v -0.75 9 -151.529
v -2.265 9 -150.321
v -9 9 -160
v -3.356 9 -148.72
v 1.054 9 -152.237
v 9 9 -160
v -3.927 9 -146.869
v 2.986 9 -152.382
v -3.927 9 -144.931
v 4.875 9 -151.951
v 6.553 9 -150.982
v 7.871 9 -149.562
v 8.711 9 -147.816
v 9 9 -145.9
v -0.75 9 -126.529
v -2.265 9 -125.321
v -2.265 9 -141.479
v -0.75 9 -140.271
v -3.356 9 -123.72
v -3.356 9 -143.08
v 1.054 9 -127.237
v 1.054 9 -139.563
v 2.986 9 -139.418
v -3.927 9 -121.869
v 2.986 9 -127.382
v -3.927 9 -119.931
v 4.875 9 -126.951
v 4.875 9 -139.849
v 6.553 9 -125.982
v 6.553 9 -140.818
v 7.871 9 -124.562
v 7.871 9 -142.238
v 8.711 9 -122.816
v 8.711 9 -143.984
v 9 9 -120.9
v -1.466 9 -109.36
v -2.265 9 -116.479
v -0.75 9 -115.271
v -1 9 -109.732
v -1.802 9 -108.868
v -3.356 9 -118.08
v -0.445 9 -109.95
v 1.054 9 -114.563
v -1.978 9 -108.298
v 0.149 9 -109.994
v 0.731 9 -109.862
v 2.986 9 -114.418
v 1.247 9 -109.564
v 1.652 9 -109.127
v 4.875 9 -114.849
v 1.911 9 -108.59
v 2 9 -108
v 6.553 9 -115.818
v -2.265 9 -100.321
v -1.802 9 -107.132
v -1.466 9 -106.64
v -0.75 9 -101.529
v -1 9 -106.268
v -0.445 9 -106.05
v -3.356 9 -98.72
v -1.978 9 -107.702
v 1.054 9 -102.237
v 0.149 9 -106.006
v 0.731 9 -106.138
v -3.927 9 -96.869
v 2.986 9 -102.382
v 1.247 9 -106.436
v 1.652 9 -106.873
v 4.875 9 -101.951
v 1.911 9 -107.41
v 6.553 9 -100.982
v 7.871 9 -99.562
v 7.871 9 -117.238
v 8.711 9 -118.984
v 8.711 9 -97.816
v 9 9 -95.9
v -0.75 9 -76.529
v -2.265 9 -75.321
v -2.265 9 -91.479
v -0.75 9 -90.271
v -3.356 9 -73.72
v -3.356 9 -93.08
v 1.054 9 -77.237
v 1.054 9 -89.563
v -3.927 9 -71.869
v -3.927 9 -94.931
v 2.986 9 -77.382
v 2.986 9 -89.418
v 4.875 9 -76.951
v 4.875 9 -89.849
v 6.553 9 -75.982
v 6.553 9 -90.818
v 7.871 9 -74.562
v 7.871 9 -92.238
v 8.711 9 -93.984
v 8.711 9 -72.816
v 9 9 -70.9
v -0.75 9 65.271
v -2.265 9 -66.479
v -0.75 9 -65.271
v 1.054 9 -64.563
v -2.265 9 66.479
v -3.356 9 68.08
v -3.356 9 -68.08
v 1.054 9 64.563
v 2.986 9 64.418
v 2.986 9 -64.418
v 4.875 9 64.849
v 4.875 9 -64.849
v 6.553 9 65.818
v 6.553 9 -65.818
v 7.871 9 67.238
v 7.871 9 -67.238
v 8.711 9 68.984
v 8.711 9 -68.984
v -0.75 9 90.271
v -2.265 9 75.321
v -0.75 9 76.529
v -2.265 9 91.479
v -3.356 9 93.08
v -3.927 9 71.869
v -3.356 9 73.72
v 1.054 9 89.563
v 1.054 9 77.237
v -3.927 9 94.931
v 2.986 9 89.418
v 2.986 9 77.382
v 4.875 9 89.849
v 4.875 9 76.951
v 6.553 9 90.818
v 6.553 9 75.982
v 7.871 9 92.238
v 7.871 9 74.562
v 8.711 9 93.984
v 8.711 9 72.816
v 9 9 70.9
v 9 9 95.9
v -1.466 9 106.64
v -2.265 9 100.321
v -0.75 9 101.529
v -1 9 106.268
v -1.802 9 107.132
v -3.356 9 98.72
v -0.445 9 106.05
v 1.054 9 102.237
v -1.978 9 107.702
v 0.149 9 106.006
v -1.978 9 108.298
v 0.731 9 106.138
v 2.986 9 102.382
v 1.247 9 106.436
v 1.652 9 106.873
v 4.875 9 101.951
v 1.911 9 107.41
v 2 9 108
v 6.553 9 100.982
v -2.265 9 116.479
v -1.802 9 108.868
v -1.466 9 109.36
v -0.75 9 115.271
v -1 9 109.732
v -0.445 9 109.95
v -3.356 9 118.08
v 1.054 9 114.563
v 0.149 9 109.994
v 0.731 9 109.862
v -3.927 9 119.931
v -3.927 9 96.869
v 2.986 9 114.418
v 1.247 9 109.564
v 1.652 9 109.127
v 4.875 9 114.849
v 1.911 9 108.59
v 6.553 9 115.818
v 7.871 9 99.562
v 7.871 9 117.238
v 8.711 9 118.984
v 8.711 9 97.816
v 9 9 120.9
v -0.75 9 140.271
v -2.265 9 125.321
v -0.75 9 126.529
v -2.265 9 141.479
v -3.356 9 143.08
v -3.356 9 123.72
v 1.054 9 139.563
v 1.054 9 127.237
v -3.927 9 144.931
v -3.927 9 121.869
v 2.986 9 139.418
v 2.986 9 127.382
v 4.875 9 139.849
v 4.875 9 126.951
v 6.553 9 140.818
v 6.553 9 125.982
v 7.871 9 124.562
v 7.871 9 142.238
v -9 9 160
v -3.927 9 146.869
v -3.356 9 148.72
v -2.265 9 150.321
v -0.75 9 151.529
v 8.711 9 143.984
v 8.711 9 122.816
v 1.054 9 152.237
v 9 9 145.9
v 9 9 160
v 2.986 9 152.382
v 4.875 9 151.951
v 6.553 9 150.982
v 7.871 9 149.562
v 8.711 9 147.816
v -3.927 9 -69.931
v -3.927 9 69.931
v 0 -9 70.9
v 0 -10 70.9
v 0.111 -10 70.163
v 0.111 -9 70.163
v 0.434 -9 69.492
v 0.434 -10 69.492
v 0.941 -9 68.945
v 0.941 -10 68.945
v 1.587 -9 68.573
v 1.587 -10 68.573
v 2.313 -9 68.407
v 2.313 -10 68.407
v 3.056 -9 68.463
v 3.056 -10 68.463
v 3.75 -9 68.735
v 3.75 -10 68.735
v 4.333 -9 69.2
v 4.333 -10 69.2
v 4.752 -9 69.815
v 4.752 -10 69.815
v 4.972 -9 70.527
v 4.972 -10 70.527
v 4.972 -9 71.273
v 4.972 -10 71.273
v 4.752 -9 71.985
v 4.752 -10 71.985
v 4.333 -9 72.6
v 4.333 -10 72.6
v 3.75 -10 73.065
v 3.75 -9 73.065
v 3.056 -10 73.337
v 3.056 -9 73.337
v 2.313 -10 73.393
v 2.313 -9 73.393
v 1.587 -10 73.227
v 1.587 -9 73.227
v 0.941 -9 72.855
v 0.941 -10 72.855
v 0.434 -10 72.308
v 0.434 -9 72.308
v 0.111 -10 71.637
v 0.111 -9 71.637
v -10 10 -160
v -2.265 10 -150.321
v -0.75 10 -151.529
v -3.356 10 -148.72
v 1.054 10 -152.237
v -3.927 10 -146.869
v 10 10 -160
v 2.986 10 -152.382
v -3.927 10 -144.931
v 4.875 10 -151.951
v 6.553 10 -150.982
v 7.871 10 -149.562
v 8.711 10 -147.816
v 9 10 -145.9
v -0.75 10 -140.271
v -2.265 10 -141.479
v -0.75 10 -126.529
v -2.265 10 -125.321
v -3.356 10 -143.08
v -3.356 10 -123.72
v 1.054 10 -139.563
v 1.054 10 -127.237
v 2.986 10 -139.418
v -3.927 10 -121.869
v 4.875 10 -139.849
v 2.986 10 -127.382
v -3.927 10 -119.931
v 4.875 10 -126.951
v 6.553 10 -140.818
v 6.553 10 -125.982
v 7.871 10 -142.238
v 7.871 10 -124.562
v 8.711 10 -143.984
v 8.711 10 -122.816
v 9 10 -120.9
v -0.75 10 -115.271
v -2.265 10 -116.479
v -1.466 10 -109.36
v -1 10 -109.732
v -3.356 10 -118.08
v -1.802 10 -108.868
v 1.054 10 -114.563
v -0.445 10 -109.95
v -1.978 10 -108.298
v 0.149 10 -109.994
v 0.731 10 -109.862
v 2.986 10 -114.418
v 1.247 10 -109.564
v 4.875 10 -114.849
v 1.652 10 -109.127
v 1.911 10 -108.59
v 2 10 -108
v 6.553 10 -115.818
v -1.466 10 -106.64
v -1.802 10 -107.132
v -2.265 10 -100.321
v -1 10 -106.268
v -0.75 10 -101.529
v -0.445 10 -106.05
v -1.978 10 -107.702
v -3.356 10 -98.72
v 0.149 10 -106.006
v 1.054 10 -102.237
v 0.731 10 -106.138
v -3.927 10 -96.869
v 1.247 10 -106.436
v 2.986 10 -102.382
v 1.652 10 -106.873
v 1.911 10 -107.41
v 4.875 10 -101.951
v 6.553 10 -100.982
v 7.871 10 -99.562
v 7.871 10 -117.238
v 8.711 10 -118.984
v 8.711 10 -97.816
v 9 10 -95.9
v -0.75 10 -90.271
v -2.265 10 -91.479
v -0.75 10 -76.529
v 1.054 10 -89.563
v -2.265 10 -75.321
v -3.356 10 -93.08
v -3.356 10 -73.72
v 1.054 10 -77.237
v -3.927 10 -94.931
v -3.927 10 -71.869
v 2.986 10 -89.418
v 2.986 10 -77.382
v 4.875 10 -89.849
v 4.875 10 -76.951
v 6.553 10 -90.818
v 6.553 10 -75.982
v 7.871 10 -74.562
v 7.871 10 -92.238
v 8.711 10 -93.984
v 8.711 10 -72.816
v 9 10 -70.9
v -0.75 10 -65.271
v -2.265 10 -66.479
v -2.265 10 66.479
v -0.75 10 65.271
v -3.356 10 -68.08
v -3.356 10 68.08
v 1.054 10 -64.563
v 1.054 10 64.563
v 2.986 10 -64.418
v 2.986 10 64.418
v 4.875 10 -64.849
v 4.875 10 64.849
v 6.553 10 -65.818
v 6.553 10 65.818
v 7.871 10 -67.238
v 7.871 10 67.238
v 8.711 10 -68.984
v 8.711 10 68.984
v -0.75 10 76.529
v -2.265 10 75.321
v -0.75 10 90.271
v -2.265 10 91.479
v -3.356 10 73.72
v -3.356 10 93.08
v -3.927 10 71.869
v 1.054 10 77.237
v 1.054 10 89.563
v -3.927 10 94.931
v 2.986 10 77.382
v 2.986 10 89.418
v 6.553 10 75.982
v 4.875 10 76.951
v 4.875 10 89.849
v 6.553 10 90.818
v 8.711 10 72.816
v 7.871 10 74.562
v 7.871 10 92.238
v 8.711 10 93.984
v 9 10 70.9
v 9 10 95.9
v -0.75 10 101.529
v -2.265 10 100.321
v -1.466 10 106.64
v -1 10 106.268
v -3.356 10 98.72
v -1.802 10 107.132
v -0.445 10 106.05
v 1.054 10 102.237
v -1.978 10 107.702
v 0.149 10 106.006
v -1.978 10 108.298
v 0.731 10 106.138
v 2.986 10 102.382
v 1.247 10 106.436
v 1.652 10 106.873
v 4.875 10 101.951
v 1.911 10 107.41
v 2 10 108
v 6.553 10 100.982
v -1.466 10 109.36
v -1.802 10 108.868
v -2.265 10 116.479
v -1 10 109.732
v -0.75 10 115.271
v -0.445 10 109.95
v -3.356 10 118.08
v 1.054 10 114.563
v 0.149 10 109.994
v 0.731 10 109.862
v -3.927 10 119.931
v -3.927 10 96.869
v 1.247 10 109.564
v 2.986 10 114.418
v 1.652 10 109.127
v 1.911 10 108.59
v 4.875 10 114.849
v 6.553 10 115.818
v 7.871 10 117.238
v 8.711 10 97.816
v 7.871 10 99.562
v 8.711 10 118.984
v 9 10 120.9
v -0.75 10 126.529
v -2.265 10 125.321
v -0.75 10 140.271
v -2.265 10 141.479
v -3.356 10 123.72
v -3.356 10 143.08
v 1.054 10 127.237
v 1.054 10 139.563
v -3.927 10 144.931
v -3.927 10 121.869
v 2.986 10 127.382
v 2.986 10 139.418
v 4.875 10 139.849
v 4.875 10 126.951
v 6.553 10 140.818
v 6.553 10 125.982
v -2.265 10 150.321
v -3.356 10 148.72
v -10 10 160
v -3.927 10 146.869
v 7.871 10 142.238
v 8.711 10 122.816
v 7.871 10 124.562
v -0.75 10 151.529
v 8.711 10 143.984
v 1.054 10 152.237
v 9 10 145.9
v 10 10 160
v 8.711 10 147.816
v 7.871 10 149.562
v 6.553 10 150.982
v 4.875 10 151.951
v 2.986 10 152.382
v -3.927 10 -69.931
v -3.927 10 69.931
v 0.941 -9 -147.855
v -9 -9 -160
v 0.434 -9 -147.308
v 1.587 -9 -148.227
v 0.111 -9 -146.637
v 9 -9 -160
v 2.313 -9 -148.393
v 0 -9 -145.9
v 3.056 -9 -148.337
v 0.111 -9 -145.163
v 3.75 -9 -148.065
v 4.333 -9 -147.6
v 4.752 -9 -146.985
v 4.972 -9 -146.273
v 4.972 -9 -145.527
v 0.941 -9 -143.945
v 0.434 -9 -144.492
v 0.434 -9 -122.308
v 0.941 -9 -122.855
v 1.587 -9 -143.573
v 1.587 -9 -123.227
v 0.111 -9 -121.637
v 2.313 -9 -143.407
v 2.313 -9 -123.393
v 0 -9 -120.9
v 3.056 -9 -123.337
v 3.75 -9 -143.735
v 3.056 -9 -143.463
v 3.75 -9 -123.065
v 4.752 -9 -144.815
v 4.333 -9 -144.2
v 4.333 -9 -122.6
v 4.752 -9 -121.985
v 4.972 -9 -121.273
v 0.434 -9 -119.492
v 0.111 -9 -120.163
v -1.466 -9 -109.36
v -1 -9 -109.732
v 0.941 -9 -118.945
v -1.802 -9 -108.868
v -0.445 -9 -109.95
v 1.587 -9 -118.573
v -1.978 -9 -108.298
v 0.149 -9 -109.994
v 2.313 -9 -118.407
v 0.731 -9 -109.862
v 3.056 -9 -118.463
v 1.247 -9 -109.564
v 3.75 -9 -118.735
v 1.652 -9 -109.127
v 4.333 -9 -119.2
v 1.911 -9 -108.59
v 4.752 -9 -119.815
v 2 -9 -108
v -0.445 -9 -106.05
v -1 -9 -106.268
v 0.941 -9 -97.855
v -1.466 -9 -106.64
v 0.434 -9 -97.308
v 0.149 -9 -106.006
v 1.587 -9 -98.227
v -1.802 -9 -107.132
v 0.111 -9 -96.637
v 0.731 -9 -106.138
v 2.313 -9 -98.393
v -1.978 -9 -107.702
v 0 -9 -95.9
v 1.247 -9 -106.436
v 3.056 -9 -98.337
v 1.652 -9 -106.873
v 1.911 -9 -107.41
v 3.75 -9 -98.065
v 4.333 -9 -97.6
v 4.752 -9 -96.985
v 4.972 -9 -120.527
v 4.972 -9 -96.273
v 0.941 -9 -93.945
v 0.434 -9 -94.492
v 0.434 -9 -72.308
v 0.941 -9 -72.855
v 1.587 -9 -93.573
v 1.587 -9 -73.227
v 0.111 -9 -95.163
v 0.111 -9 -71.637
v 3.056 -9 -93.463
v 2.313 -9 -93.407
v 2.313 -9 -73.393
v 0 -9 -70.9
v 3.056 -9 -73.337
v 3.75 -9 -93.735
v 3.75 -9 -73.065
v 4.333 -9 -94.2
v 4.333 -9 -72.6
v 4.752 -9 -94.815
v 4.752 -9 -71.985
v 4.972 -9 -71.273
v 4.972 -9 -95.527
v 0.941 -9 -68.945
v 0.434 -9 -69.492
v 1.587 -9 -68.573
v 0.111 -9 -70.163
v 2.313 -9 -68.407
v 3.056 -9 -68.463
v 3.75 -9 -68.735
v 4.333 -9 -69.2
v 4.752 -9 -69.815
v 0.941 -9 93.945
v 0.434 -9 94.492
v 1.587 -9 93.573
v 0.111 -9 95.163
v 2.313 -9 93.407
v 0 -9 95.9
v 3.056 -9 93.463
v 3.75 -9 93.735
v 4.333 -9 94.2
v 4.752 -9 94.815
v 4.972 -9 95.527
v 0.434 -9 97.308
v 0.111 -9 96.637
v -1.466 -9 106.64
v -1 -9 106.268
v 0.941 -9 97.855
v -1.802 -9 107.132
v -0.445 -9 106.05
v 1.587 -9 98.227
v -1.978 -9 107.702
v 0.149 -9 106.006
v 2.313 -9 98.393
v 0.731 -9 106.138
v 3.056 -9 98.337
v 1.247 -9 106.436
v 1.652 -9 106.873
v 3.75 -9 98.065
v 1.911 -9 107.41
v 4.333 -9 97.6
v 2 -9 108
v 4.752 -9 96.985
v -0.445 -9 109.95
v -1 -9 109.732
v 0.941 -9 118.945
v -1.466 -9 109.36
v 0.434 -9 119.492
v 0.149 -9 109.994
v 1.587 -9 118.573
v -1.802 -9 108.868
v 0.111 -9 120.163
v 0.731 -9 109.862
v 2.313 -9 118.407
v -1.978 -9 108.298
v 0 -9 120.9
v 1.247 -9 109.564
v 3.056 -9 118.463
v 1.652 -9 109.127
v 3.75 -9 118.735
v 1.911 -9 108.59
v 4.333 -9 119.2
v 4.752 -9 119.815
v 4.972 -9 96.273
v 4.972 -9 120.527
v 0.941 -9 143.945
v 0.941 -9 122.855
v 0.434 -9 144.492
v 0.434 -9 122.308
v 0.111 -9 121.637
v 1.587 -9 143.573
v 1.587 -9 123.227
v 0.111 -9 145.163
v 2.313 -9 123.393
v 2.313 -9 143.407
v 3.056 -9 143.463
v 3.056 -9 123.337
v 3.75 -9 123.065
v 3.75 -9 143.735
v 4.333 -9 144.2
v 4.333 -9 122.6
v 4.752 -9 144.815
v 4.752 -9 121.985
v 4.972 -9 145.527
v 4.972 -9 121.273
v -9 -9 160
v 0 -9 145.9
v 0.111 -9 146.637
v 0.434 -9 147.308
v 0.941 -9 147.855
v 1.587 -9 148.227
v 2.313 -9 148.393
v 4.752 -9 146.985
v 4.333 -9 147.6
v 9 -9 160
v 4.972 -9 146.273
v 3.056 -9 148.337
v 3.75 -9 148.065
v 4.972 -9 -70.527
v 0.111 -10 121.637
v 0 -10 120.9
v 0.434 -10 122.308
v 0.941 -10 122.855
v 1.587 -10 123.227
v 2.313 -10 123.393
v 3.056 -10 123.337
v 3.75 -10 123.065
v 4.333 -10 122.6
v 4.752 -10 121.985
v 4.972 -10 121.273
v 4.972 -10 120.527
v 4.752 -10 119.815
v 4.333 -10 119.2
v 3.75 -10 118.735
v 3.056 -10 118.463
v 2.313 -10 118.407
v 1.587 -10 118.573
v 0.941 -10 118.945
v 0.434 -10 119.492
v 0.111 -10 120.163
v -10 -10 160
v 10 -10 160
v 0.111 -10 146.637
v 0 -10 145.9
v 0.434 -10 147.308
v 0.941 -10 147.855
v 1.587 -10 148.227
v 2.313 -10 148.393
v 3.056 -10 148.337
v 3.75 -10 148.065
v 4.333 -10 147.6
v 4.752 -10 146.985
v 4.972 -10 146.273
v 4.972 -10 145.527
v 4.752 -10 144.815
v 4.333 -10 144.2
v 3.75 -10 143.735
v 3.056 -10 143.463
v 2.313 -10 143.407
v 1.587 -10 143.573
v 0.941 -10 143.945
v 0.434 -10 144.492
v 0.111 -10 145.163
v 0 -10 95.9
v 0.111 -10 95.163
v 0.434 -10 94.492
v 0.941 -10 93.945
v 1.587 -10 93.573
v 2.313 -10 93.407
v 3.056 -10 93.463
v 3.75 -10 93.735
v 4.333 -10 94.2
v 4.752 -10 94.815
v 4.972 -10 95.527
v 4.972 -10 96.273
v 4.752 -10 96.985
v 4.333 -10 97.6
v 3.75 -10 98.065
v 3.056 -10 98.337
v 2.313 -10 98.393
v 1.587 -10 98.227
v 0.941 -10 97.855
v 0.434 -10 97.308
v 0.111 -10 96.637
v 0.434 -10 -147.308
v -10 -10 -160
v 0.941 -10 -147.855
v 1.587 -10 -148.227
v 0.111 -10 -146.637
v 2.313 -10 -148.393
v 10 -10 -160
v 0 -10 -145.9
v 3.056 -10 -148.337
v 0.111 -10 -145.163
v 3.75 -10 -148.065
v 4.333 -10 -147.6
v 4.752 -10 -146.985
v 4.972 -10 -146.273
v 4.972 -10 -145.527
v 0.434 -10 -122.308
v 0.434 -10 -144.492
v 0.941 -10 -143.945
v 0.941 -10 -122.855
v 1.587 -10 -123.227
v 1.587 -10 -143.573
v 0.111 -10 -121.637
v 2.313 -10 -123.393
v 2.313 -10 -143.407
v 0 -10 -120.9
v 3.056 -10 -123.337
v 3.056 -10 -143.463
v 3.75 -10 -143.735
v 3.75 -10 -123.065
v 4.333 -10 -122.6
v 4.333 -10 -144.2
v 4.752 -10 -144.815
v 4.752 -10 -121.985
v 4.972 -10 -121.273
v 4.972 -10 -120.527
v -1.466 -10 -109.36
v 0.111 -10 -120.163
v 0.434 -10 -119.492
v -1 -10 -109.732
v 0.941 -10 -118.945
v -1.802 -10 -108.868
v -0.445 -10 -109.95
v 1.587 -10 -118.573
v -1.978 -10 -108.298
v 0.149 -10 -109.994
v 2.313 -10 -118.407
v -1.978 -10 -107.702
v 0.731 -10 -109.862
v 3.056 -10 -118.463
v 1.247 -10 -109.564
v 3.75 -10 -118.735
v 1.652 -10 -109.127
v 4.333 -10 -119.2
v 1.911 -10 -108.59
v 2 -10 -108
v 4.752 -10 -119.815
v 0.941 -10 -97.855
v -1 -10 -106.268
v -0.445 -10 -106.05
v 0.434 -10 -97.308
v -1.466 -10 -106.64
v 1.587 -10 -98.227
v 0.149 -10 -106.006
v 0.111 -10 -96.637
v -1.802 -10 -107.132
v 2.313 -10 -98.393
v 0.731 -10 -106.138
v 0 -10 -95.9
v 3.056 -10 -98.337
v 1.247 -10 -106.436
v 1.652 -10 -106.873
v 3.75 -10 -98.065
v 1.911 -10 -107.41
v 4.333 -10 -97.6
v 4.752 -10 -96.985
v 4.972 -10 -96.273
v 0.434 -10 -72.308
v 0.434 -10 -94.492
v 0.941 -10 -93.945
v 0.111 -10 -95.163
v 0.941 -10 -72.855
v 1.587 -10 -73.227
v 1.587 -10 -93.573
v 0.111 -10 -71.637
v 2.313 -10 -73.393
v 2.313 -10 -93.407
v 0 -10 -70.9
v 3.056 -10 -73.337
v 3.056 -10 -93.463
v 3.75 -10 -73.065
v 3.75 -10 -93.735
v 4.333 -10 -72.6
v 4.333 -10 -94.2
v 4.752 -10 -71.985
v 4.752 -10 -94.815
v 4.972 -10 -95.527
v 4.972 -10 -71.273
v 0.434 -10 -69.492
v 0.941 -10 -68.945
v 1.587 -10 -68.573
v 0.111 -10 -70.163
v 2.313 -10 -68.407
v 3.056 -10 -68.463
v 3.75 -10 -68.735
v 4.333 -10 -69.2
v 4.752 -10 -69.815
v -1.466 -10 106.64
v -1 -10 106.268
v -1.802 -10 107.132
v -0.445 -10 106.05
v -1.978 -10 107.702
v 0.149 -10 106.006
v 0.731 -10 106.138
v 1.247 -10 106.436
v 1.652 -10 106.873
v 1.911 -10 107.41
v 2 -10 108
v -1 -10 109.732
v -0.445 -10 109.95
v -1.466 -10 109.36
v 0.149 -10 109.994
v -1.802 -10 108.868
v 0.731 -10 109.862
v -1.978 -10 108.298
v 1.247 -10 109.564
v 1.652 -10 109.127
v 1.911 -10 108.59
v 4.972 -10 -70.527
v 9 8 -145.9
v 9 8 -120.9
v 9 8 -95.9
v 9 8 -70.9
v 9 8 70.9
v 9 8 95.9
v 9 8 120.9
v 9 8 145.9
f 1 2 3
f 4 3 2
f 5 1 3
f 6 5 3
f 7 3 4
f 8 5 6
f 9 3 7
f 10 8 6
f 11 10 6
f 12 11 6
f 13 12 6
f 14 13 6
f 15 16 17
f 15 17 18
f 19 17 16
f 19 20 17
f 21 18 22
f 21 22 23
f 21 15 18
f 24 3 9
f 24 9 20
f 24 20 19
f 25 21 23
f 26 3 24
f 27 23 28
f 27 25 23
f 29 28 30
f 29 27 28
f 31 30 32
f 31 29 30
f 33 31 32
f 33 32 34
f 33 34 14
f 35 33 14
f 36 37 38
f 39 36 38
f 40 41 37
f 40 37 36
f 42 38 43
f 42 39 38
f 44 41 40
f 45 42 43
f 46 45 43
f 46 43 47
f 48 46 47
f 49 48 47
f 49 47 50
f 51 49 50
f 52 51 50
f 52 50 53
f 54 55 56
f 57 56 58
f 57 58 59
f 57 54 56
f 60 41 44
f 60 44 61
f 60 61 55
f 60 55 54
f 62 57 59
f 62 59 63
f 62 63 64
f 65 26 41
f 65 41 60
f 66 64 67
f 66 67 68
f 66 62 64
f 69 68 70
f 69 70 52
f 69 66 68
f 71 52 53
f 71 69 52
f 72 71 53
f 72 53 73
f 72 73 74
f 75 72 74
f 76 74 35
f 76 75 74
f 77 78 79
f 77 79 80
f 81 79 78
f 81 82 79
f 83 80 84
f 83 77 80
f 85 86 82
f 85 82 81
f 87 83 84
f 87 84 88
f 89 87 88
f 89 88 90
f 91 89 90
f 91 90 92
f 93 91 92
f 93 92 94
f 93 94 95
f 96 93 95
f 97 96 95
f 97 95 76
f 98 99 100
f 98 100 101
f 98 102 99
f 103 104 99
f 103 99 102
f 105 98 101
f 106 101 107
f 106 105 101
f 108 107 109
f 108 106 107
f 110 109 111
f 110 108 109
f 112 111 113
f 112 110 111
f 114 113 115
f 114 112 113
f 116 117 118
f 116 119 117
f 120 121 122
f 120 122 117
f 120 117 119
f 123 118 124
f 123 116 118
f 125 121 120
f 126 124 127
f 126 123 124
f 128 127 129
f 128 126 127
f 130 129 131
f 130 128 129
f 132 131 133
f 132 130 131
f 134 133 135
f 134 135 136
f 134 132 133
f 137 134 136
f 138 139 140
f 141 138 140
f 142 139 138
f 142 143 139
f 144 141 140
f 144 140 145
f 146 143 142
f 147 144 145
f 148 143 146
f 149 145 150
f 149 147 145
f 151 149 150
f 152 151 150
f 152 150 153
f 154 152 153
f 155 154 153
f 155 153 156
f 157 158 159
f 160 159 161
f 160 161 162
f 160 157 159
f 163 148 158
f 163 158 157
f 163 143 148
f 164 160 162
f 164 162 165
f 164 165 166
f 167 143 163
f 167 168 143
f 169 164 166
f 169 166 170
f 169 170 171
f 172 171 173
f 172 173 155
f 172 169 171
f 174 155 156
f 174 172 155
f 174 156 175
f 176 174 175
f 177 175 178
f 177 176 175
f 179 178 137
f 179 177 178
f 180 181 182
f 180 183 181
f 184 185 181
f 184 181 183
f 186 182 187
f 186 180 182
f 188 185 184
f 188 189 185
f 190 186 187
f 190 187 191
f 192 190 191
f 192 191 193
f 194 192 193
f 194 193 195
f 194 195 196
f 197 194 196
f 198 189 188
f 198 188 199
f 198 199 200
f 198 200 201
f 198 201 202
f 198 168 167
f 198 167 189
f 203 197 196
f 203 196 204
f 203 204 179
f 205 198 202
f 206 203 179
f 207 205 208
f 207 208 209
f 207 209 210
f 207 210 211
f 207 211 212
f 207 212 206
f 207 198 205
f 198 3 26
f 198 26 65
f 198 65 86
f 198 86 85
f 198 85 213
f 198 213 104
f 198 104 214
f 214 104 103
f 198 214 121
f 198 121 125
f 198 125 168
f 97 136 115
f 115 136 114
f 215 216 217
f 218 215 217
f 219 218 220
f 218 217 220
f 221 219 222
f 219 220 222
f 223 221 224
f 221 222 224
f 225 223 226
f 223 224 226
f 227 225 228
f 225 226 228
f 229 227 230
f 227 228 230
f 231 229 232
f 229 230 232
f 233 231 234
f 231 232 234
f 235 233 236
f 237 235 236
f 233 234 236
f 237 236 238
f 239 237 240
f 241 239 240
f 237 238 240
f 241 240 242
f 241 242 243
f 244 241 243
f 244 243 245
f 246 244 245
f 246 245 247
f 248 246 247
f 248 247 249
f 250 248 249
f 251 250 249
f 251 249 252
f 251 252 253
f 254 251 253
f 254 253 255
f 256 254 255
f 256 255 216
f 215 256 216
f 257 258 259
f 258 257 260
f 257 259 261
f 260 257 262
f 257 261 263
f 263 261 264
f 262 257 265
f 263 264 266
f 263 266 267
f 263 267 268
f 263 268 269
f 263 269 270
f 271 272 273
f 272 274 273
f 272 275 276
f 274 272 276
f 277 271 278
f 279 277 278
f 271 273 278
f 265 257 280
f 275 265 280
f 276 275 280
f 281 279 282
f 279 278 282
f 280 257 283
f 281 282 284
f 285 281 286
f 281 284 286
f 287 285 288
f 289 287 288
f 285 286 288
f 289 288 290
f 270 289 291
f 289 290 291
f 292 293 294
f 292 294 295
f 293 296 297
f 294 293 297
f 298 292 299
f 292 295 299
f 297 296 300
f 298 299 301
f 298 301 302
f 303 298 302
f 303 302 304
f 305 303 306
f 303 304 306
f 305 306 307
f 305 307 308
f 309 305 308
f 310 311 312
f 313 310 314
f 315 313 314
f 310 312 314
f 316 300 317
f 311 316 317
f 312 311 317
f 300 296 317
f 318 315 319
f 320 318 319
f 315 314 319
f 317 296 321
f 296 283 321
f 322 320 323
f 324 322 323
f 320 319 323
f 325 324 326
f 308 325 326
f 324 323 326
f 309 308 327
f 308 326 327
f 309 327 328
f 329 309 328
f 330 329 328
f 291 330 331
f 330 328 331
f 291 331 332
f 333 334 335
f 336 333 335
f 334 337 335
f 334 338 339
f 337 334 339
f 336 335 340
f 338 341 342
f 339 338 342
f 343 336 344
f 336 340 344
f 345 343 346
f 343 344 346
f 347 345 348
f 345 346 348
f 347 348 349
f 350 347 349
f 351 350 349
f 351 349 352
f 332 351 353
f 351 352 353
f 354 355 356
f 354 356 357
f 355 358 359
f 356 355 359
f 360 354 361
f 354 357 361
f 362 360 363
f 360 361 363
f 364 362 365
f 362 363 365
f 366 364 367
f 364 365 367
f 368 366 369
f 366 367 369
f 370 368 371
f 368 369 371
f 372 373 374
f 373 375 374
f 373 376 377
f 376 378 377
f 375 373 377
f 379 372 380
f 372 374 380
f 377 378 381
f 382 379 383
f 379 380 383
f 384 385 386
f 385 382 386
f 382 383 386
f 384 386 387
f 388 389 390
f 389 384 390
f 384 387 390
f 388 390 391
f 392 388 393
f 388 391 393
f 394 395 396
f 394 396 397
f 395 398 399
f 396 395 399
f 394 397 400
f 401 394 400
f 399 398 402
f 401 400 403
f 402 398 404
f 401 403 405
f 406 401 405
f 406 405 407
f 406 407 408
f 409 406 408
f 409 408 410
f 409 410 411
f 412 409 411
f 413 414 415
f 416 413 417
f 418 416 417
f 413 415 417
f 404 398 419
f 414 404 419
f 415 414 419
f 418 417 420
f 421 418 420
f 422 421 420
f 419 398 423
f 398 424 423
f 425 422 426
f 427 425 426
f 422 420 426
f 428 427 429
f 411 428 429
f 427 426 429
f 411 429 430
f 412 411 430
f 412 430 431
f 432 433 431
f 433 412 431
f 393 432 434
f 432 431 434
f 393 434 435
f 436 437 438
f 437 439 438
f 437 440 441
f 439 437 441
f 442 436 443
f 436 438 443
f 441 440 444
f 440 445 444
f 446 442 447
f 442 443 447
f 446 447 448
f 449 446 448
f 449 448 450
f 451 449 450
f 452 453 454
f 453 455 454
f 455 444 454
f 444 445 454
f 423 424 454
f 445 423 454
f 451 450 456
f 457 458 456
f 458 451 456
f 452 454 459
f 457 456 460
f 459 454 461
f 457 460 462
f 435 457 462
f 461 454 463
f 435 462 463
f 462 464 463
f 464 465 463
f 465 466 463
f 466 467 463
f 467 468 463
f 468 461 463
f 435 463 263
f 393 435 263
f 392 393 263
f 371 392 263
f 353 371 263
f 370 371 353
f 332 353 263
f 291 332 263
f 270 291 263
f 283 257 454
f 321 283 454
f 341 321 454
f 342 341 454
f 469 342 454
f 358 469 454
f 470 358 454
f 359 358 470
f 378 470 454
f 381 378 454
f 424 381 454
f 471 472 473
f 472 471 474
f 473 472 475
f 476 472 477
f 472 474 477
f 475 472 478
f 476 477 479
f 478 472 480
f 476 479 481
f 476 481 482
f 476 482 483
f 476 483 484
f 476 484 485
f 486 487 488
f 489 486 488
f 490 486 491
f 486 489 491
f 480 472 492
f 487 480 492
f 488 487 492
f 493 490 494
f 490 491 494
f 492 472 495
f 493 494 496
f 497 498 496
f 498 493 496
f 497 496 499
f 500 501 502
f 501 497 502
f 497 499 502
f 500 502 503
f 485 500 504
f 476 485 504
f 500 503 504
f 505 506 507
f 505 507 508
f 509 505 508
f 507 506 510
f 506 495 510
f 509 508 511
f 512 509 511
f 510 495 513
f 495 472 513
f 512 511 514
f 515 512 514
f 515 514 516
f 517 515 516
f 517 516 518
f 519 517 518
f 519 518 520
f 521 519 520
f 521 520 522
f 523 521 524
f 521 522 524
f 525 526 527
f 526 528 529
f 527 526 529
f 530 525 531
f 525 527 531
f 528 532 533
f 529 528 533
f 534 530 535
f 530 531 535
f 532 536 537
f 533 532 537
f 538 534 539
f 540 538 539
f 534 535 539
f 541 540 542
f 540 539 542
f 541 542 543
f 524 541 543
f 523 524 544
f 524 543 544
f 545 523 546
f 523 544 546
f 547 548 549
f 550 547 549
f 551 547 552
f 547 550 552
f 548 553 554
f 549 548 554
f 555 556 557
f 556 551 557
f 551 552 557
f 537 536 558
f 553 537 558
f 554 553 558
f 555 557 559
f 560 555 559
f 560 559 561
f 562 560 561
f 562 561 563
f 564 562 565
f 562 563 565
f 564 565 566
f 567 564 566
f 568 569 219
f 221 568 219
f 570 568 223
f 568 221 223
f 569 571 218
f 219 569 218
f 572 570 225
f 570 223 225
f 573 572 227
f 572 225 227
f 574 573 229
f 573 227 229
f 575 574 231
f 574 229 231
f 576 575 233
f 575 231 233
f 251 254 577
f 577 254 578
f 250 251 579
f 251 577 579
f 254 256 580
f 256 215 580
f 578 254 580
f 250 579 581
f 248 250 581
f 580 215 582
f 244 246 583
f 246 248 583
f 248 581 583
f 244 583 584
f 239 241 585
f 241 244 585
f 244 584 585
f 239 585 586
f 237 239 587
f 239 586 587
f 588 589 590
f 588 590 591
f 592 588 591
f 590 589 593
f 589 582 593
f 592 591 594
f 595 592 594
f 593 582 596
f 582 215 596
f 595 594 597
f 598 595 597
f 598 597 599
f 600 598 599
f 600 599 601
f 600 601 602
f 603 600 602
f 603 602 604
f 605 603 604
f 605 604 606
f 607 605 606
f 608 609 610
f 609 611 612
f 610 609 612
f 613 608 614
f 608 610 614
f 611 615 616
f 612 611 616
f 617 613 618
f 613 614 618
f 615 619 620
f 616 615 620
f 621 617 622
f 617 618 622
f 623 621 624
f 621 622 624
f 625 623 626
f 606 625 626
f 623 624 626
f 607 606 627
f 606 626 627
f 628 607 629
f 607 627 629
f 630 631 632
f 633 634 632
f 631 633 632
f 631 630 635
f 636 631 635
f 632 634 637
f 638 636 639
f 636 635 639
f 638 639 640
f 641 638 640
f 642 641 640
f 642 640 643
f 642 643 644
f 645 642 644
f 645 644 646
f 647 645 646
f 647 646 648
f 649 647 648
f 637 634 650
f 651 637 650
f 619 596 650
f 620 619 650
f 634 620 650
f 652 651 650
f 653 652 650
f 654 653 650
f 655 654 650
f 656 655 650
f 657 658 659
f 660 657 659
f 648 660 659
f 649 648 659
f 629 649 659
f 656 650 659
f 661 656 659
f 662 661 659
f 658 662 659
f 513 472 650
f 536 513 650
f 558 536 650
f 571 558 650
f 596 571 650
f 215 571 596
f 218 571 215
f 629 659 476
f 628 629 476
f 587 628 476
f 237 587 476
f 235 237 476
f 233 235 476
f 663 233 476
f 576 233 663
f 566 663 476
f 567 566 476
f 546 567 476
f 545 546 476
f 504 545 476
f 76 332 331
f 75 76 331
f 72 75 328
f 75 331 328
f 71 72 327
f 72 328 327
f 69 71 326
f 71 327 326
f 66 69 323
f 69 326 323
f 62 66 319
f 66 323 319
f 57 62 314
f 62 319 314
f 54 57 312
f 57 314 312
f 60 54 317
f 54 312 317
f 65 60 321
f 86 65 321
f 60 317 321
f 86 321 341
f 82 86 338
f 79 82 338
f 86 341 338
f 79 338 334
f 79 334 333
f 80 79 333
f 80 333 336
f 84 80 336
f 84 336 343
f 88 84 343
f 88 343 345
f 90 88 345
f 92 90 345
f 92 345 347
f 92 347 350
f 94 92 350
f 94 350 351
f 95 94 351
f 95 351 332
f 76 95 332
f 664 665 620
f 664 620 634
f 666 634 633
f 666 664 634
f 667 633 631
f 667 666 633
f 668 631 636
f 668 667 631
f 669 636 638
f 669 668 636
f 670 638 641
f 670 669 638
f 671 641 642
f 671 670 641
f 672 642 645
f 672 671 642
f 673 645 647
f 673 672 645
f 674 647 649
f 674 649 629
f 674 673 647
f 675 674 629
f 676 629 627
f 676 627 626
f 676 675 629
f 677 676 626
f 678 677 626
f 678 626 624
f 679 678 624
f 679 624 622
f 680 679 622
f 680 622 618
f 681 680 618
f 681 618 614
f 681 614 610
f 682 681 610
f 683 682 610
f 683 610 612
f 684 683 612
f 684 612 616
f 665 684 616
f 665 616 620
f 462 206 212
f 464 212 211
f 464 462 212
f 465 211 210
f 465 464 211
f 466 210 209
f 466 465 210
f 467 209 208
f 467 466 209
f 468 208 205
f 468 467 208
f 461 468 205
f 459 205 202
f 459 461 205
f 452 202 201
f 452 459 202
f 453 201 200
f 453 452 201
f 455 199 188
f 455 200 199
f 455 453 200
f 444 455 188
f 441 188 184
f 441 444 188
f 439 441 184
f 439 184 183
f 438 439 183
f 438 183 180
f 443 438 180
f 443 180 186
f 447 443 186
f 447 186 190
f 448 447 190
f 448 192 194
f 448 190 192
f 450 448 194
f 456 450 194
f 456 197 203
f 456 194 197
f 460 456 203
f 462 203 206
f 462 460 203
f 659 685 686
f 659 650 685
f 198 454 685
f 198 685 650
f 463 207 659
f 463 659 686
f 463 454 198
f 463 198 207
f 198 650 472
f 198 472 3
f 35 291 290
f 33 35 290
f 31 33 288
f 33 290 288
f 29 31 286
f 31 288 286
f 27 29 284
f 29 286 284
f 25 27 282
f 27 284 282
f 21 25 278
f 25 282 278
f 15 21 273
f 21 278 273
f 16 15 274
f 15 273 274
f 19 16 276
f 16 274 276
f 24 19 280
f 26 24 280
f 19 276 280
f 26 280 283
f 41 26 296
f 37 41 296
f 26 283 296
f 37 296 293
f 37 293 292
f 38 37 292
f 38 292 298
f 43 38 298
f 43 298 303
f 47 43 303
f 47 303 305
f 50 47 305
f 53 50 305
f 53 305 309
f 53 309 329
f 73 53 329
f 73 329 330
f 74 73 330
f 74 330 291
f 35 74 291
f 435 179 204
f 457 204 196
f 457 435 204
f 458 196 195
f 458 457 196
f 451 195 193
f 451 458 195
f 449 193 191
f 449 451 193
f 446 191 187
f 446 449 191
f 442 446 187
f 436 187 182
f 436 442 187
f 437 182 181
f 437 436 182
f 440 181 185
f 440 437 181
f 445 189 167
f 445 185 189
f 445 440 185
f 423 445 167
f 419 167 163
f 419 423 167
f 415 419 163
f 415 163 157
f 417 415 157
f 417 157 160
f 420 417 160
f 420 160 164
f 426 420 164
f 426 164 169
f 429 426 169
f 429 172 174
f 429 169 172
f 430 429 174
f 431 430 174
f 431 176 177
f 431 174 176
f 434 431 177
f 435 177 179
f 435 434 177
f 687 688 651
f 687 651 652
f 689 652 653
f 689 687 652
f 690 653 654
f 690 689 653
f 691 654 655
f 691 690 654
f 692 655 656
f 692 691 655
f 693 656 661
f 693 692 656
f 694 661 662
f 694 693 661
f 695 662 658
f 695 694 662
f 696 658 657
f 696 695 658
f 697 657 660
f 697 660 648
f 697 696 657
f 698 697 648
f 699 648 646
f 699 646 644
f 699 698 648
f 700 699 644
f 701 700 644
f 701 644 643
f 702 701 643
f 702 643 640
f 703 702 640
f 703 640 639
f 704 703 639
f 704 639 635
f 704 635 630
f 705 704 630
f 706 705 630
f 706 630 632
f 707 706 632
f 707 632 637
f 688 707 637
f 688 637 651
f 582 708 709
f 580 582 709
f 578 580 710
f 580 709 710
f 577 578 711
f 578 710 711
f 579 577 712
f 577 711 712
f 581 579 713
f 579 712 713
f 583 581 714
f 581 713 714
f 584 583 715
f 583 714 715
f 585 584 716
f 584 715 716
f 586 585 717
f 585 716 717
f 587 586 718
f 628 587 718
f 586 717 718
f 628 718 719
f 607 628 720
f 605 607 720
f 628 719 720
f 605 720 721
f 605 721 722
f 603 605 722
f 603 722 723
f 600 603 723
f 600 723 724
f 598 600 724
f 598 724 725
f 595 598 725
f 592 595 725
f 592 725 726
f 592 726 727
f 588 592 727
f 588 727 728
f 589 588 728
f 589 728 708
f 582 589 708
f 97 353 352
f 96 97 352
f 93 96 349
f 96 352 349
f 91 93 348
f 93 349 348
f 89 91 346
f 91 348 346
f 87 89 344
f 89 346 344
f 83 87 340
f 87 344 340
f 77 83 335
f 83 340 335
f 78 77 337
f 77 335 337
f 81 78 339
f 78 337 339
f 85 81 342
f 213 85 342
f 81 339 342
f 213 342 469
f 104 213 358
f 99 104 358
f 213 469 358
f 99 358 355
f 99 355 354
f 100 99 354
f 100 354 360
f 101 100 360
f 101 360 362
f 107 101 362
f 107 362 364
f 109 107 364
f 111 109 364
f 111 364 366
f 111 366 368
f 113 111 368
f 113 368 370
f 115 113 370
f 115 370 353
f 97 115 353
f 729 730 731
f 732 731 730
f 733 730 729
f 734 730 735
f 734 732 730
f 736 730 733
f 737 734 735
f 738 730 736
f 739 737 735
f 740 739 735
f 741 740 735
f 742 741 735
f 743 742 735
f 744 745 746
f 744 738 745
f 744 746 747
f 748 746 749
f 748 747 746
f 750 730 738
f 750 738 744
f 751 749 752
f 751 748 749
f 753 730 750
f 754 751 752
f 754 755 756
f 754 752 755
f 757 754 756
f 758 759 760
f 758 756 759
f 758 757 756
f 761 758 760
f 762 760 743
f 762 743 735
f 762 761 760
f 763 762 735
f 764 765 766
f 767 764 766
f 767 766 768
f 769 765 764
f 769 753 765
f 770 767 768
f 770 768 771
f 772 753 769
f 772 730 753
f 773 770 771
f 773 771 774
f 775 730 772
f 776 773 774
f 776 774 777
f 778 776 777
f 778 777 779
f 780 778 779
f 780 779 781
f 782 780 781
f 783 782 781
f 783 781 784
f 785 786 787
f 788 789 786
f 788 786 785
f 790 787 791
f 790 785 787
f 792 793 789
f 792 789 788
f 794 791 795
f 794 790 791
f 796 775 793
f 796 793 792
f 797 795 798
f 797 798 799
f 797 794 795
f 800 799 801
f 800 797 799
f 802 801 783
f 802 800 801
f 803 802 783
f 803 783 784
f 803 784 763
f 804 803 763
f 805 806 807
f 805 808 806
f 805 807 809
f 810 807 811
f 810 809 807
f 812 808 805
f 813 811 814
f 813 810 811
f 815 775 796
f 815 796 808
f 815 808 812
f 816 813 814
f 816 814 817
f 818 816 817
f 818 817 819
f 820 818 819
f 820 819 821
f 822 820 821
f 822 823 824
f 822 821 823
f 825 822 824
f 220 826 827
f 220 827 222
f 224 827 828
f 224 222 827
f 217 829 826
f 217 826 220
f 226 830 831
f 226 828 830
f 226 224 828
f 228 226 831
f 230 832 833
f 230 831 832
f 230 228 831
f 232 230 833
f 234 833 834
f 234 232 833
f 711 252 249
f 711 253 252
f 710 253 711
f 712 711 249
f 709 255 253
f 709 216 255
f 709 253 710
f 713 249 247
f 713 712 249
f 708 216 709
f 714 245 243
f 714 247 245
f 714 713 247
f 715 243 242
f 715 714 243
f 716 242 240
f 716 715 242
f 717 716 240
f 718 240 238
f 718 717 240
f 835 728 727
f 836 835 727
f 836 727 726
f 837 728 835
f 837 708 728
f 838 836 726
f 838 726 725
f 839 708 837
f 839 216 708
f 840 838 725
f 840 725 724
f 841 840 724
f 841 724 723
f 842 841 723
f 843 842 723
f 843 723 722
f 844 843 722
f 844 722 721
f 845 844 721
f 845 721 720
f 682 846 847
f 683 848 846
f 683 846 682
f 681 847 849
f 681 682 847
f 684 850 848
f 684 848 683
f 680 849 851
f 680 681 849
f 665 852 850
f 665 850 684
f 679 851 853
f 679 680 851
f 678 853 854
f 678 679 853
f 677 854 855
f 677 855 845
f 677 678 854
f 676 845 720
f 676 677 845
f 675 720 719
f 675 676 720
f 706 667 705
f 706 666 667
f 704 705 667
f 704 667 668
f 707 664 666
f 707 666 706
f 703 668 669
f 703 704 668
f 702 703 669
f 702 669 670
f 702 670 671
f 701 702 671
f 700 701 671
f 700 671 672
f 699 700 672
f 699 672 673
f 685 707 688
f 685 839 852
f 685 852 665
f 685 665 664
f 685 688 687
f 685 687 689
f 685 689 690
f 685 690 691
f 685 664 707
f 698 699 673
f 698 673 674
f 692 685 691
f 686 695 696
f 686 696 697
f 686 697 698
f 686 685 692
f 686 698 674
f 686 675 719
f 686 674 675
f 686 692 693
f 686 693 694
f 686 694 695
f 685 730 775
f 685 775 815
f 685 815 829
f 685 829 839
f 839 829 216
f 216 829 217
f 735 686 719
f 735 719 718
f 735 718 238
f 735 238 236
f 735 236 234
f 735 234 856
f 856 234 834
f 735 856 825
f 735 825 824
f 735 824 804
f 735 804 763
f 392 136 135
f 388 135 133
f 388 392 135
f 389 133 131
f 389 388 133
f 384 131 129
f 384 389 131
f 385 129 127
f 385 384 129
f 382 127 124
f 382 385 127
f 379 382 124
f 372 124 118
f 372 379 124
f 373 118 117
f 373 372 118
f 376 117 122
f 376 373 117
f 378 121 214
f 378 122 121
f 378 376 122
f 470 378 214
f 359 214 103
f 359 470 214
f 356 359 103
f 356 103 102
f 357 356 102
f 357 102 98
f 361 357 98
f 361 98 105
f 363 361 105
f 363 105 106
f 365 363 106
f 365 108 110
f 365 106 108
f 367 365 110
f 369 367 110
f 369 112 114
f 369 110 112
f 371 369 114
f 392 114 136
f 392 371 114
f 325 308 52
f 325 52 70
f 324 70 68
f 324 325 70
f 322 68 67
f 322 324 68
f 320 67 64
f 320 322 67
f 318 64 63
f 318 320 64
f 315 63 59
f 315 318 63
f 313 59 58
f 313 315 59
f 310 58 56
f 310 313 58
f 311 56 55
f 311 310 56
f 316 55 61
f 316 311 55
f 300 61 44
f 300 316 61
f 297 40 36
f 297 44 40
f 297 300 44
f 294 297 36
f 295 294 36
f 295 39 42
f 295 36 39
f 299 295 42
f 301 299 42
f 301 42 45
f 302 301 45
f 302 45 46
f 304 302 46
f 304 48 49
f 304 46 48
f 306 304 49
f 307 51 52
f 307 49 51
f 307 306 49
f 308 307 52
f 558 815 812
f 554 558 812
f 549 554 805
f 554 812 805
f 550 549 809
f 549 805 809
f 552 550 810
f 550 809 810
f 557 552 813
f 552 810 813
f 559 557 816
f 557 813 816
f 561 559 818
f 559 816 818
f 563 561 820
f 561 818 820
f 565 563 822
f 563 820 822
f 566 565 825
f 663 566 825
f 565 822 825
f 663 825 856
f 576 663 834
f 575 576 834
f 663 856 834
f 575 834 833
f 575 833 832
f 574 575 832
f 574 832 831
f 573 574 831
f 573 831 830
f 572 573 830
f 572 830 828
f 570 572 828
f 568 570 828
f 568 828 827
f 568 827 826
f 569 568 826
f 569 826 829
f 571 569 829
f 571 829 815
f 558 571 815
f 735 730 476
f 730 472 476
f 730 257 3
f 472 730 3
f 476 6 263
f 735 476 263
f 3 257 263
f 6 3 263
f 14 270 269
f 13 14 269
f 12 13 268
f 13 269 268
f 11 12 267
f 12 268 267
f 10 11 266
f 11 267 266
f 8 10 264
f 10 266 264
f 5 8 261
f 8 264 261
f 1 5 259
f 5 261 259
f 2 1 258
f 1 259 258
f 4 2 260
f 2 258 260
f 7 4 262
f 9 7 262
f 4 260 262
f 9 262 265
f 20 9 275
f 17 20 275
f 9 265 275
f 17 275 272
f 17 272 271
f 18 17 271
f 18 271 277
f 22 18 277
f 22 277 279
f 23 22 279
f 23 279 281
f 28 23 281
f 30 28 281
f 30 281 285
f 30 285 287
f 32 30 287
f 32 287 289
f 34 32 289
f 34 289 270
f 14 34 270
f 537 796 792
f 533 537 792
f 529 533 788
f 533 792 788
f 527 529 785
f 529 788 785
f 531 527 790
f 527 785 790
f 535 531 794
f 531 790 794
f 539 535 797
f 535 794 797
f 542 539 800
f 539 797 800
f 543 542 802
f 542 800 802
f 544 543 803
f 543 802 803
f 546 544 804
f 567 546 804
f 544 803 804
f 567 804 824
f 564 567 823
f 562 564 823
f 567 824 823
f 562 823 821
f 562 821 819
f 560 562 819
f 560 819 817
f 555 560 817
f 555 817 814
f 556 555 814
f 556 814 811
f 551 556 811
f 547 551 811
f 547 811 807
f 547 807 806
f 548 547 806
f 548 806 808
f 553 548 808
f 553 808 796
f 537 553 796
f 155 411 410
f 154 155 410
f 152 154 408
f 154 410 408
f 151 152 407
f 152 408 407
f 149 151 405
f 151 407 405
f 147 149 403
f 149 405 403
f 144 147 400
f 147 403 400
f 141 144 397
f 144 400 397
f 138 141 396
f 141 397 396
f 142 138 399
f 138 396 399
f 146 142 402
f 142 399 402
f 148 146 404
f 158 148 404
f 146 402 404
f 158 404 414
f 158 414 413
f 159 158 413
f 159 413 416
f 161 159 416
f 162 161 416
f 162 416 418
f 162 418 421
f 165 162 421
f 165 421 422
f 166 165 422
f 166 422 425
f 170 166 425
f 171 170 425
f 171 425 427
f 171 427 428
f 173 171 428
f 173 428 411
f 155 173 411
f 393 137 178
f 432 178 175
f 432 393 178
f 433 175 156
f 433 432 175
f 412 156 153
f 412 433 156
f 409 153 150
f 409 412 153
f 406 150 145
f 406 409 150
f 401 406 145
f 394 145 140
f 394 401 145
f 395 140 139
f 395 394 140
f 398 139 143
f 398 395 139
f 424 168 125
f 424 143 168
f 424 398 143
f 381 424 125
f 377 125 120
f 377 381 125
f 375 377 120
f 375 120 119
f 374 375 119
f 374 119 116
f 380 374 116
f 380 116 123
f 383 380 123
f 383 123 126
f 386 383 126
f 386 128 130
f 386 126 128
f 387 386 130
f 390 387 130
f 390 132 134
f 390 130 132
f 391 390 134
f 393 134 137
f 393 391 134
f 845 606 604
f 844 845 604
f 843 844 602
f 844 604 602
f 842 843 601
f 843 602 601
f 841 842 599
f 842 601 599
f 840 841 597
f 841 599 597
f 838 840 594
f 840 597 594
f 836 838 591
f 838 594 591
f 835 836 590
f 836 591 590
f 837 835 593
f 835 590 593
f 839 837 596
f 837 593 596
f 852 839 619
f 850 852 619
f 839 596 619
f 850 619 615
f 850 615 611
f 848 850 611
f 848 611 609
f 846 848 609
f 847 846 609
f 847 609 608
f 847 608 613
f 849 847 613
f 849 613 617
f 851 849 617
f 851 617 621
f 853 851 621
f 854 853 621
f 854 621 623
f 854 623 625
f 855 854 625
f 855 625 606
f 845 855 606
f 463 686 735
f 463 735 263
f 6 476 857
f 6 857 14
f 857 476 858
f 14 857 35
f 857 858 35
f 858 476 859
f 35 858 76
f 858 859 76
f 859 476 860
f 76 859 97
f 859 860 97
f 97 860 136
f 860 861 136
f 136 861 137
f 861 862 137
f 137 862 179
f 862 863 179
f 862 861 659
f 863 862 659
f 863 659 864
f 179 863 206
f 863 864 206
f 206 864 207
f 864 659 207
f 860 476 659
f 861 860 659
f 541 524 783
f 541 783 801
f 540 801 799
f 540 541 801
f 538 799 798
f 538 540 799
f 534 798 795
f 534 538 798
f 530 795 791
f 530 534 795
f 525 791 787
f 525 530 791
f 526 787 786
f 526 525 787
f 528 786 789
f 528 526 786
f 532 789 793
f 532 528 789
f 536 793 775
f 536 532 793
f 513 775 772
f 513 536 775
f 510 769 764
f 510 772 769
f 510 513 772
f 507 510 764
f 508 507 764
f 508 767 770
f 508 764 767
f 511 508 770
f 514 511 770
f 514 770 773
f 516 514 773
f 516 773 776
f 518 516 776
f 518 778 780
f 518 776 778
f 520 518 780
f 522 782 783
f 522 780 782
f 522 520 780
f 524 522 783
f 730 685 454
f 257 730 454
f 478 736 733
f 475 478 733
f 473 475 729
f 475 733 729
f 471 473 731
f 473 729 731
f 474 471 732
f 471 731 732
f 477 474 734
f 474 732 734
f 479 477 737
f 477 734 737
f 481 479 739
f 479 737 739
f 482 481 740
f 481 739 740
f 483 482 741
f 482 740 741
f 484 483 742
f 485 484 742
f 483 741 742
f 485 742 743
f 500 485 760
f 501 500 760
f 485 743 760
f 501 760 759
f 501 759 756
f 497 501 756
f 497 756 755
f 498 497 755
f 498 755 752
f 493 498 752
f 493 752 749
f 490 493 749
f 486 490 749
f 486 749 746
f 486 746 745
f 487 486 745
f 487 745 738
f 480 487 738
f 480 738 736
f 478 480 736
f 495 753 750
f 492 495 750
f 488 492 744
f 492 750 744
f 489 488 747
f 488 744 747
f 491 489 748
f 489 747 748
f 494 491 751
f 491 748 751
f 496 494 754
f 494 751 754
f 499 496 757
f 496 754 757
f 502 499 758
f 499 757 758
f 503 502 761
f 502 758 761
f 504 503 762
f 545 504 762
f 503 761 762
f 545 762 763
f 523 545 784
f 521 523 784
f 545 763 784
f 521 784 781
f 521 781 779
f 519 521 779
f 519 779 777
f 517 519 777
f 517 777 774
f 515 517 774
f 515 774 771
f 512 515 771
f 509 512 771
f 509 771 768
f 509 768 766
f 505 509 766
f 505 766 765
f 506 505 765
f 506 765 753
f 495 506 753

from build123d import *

# Parameters (mm, degrees)
SKETCH_1_W                  = 20
SKETCH_1_H                  = 20
SKETCH_1_W_2                = 18
SKETCH_1_H_2                = 18
EXTRUDE_1_DEPTH             = 160
HOLE_WIZARD_5_0_5_1_REACH   = 163.555
HOLE_WIZARD_5_0_5_1_BORE_R  = 2.5
PATTERN_LINEAR_1_COUNT      = 2
PATTERN_LINEAR_1_PITCH      = 50
MIRROR_1_COPY_1_REACH       = 163.555
MIRROR_1_COPY_1_SKETCH_R    = 2.5
HOLE_WIZARD_4_0_4_1_D       = 4
HOLE_WIZARD_13_0_13_1_D     = 13
HOLE_WIZARD_13_0_13_1_DEPTH = 1


with BuildPart() as part:
    # 草图1 → 凸台-拉伸1 (new, symmetric)
    with BuildSketch(Plane.XY):
        Rectangle(SKETCH_1_W, SKETCH_1_H)
        Rectangle(SKETCH_1_W_2, SKETCH_1_H_2, mode=Mode.SUBTRACT)
    extrude(amount=EXTRUDE_1_DEPTH, both=True)

    # Ø5.0 (5) 直径孔1 bore → Ø5.0 (5) 直径孔1 (cut, up to next)
    with BuildSketch(Plane(origin=(0, -10, 0), x_dir=(-1, 0, 0), z_dir=(0, -1, 0)), mode=Mode.PRIVATE) as hole_wizard_5_0_5_1_sk1:
        with Locations((-2.5, 145.9)):
            Circle(HOLE_WIZARD_5_0_5_1_BORE_R)
    hole_wizard_5_0_5_1_tool1 = extrude(hole_wizard_5_0_5_1_sk1.sketch, amount=-HOLE_WIZARD_5_0_5_1_REACH, mode=Mode.PRIVATE) & part.part
    # Ø5.0 (5) 直径孔1 bore → Ø5.0 (5) 直径孔1 (cut, up to next)
    with BuildSketch(Plane(origin=(0, -10, 0), x_dir=(-1, 0, 0), z_dir=(0, -1, 0)), mode=Mode.PRIVATE) as hole_wizard_5_0_5_1_sk2:
        with Locations((-2.5, 120.9)):
            Circle(HOLE_WIZARD_5_0_5_1_BORE_R)
    hole_wizard_5_0_5_1_tool2 = extrude(hole_wizard_5_0_5_1_sk2.sketch, amount=-HOLE_WIZARD_5_0_5_1_REACH, mode=Mode.PRIVATE) & part.part
    hole_wizard_5_0_5_1_1 = hole_wizard_5_0_5_1_tool1.solids().sort_by_distance((2.5, -10, -145.9))[0]
    add(hole_wizard_5_0_5_1_1, mode=Mode.SUBTRACT)
    hole_wizard_5_0_5_1_2 = hole_wizard_5_0_5_1_tool2.solids().sort_by_distance((2.5, -10, -120.9))[0]
    add(hole_wizard_5_0_5_1_2, mode=Mode.SUBTRACT)
    hole_wizard_5_0_5_1 = hole_wizard_5_0_5_1_1 + hole_wizard_5_0_5_1_2  # Ø5.0 (5) 直径孔1 as one shape, for the pattern or mirror that repeats it

    # 阵列(线性)1: Ø5.0 (5) 直径孔1 ×2
    with Locations(*[(0, 0, i * PATTERN_LINEAR_1_PITCH) for i in range(1, PATTERN_LINEAR_1_COUNT)]):
        add(hole_wizard_5_0_5_1, mode=Mode.SUBTRACT)

    # 镜向1: Ø5.0 (5) 直径孔1 across plane
    add(hole_wizard_5_0_5_1.mirror(Plane(origin=(0, 0, 0), x_dir=(1, 0, 0), z_dir=(0, 0, -1))), mode=Mode.SUBTRACT)

    # 镜向1 copy 1 sketch → 镜向1 copy 1 (cut, up to next)
    with BuildSketch(Plane(origin=(0, -10, -50), x_dir=(-1, 0, 0), z_dir=(0, -1, 0)), mode=Mode.PRIVATE) as mirror_1_copy_1_sk1:
        with Locations((-2.5, -145.9)):
            Circle(MIRROR_1_COPY_1_SKETCH_R)
    mirror_1_copy_1_tool1 = extrude(mirror_1_copy_1_sk1.sketch, amount=-MIRROR_1_COPY_1_REACH, mode=Mode.PRIVATE) & part.part
    # 镜向1 copy 1 sketch → 镜向1 copy 1 (cut, up to next)
    with BuildSketch(Plane(origin=(0, -10, -50), x_dir=(-1, 0, 0), z_dir=(0, -1, 0)), mode=Mode.PRIVATE) as mirror_1_copy_1_sk2:
        with Locations((-2.5, -120.9)):
            Circle(MIRROR_1_COPY_1_SKETCH_R)
    mirror_1_copy_1_tool2 = extrude(mirror_1_copy_1_sk2.sketch, amount=-MIRROR_1_COPY_1_REACH, mode=Mode.PRIVATE) & part.part
    add(mirror_1_copy_1_tool1.solids().sort_by_distance((2.5, -10, 95.9))[0], mode=Mode.SUBTRACT)
    add(mirror_1_copy_1_tool2.solids().sort_by_distance((2.5, -10, 70.9))[0], mode=Mode.SUBTRACT)

    # Ø4.0 (4) 直径孔1 (through all)
    with Locations(Plane(origin=(0, -10, 0), x_dir=(-1, 0, 0), z_dir=(0, -1, 0))):
        with Locations((0, -108)):
            hole_wizard_4_0_4_1 = Hole(HOLE_WIZARD_4_0_4_1_D / 2)

    # 镜向2: Ø4.0 (4) 直径孔1 across plane
    add(hole_wizard_4_0_4_1.mirror(Plane(origin=(0, 0, 0), x_dir=(1, 0, 0), z_dir=(0, 0, -1))), mode=Mode.SUBTRACT)

    # Ø13.0 (13) 直径孔1
    with Locations(Plane(origin=(0, 9, 0), x_dir=(-1, 0, 0), z_dir=(0, -1, 0))):
        with Locations((-2.5, 145.9), (-2.5, 120.9), (-2.5, 95.9), (-2.5, 70.9)):
            hole_wizard_13_0_13_1 = Hole(HOLE_WIZARD_13_0_13_1_D / 2, depth=HOLE_WIZARD_13_0_13_1_DEPTH)

    # 镜向3: Ø13.0 (13) 直径孔1 across plane
    add(hole_wizard_13_0_13_1.mirror(Plane(origin=(0, 0, 0), x_dir=(1, 0, 0), z_dir=(0, 0, -1))), mode=Mode.SUBTRACT)


solid = part.part
